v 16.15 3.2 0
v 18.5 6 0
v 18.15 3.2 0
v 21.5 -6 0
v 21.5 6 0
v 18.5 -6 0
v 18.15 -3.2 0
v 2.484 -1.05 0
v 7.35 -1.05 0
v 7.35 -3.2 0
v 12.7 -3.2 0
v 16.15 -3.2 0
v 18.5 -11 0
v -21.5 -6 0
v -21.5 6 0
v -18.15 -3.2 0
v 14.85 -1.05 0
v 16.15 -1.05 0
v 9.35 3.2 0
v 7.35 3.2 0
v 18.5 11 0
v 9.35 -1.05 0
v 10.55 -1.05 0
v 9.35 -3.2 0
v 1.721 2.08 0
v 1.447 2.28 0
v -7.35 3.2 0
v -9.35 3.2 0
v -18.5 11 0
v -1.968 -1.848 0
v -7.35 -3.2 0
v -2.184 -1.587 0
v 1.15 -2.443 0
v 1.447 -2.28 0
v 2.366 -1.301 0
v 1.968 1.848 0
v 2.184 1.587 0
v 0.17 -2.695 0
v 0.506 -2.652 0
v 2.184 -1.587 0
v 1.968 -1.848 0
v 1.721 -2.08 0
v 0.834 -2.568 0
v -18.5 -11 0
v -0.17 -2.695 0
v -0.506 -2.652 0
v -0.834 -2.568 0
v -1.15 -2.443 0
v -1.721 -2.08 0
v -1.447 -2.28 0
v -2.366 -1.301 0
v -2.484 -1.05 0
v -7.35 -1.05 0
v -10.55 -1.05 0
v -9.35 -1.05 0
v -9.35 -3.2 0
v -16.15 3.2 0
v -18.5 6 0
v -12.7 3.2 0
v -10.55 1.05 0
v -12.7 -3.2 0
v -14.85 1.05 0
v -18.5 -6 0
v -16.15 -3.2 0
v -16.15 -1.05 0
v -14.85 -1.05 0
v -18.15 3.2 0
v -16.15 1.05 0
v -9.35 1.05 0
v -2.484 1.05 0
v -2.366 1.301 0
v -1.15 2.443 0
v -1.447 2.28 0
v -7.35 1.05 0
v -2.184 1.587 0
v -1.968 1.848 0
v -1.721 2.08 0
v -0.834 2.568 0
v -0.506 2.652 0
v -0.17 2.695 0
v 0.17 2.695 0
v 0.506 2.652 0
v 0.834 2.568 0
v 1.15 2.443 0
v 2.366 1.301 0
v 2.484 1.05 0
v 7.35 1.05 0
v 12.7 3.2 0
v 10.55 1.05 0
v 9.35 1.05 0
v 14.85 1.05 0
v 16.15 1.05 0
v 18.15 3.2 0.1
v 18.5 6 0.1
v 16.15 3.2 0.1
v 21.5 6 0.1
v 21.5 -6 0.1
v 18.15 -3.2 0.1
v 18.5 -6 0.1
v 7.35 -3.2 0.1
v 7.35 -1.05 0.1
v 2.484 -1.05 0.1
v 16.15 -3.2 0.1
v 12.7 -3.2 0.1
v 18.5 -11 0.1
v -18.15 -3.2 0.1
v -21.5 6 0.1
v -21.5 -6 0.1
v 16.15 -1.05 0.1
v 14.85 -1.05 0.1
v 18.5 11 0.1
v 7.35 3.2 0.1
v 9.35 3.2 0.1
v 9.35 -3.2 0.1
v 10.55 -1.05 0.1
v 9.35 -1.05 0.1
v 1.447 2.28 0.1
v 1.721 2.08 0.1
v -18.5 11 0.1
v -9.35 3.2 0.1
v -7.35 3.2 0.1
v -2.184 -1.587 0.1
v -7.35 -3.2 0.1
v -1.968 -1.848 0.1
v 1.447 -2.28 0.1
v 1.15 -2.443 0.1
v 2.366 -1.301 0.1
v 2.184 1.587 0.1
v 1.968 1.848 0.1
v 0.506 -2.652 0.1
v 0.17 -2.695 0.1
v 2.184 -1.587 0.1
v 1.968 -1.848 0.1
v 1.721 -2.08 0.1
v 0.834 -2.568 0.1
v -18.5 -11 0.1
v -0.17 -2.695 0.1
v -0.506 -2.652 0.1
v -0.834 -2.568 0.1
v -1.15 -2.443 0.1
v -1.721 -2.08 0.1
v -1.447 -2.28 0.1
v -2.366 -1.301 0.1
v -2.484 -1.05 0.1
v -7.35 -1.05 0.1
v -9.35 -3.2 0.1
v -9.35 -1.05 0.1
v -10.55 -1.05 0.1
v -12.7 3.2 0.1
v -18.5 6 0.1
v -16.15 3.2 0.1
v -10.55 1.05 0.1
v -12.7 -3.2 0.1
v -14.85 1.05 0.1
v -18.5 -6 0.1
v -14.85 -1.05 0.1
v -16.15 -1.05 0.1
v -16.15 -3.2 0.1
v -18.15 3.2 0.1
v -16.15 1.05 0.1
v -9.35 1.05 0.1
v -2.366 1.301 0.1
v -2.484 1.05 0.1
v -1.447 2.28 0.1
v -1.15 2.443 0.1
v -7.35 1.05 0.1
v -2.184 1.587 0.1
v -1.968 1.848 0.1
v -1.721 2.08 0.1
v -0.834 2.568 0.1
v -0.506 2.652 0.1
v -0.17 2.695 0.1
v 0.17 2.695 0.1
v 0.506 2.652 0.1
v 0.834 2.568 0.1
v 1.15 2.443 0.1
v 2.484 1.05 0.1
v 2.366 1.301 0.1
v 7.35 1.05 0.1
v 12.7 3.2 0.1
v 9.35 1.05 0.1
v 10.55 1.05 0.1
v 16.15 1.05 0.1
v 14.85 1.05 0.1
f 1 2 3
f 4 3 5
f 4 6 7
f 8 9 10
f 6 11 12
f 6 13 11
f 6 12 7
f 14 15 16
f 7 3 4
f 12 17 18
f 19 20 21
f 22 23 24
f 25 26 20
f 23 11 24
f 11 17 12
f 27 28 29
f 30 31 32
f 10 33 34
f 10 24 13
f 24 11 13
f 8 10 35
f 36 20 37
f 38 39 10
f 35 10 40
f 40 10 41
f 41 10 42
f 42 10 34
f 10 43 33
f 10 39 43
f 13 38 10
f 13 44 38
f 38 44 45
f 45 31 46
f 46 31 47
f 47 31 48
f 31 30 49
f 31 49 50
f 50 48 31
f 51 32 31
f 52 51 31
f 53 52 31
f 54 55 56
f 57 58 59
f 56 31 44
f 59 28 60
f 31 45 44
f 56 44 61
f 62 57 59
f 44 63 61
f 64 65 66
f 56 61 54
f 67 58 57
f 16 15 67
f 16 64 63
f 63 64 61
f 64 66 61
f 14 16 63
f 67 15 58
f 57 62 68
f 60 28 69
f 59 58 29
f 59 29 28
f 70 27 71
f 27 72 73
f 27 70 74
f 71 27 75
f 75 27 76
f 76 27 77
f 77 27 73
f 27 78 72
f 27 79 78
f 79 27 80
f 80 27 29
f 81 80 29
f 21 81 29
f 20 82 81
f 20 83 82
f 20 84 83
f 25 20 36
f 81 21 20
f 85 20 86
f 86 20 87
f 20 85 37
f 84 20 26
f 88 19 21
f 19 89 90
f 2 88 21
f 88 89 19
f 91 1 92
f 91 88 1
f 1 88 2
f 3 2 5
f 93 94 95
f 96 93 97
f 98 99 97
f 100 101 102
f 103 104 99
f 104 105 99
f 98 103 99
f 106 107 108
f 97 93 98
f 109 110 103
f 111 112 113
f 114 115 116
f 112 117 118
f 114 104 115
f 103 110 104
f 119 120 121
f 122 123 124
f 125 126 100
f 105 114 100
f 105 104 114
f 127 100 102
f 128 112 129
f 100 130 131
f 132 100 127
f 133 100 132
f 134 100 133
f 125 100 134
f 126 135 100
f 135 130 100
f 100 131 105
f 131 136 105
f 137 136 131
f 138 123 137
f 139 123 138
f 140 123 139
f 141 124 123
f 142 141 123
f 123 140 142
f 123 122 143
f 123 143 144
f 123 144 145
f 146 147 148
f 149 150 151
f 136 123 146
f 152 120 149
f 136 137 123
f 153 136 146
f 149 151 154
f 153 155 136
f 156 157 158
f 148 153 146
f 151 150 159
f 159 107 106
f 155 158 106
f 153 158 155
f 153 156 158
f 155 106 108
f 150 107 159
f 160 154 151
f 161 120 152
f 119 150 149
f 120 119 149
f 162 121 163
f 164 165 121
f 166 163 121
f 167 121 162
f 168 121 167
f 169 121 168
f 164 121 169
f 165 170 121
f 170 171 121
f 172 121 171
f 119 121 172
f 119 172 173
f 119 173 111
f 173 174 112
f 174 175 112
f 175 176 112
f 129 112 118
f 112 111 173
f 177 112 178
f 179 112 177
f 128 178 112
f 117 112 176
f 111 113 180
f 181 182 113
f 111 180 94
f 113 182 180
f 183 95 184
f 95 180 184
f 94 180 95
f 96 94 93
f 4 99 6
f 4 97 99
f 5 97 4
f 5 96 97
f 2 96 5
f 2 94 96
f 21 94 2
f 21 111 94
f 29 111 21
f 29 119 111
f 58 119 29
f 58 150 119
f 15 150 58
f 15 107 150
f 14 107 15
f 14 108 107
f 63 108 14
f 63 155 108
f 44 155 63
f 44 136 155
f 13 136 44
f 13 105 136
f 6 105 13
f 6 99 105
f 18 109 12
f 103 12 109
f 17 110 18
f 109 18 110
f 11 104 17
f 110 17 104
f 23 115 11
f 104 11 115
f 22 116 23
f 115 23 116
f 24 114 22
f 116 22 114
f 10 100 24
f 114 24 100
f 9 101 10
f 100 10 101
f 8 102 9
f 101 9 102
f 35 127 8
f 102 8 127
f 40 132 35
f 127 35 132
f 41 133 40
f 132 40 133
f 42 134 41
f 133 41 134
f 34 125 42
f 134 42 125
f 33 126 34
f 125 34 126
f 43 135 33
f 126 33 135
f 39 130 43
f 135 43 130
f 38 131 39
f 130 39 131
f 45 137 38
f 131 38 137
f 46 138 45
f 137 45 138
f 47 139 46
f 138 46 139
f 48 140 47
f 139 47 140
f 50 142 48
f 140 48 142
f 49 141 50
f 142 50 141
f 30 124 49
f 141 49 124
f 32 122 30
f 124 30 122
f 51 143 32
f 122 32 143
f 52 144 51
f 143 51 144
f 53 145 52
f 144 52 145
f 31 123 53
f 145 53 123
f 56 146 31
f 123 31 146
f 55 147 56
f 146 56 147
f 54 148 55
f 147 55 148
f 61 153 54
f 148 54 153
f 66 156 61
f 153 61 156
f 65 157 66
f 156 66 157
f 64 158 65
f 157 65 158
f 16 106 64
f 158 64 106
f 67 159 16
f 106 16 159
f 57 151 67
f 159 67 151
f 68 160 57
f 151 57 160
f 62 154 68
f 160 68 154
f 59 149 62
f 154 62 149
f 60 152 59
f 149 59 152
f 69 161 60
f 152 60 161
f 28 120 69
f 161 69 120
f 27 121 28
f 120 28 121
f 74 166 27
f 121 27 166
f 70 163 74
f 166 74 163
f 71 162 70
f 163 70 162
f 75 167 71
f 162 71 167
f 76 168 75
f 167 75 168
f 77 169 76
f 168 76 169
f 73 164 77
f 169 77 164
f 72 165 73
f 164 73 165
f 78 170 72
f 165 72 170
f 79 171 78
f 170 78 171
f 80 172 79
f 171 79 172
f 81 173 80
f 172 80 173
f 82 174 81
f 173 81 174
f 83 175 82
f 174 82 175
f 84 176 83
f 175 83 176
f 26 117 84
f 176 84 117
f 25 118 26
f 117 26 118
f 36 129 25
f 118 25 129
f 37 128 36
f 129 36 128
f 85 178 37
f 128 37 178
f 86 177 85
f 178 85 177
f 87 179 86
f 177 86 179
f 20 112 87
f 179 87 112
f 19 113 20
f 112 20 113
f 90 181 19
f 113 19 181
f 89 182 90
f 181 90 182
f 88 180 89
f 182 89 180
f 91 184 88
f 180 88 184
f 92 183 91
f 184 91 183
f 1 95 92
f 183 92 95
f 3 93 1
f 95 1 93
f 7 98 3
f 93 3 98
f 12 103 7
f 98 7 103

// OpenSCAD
//https://www.badgerandblade.com/forum/threads/my-process-of-measuring-de-razor-blade-dimensions-for-b-b-shavewiki.509238/
/* razorBladeDimensions*/
//Thickness
bldT=0.1;
//Width
bldW=22;
//Length
bldL=43;
//Tab Width
bldTW=12; //?
//Cutting Edge Length
bldCEL=37;
//Recessed Length
bldRL=0;
//Cutout Width
bldCW=2.1;
//Cutout Length
bldCL=36.3;
bldCES="F"; //["F":"Flat","A":"Angled"]
bldCD=5.4;

//Diamond radius
bldDR=0;
//Diamond distance
bldDD=25.4;
bldDW=6.4;

// -- Keyholes --
//keyholes length
bldKL=2;
//inner Keyholes width
bldIKW=6.4;
//inner Keyholes distance
bldIKD=16.7;
//Keyholes radius
bldKR=0;
blOKW=6.4;

/* [Hidden] */
$fn=50;

linear_extrude(bldT) difference(){
  union(){
    square([bldL,bldTW],true);
    square([bldCEL,bldW],true);
  }
  //center hole
  circle(d=bldCD);
  //slot
  square([bldCL,bldCW],true);
  //keys and diamonds
  for (ix=[-1,1]){
    translate([ix*bldIKD/2,0]) square([bldKL,bldIKW],true);
    translate([ix*(bldCL-bldKL)/2,0]) square([bldKL,bldIKW],true);
    translate([ix*bldDD/2,0]) circle(d=bldDW,$fn=4);
  }
}
